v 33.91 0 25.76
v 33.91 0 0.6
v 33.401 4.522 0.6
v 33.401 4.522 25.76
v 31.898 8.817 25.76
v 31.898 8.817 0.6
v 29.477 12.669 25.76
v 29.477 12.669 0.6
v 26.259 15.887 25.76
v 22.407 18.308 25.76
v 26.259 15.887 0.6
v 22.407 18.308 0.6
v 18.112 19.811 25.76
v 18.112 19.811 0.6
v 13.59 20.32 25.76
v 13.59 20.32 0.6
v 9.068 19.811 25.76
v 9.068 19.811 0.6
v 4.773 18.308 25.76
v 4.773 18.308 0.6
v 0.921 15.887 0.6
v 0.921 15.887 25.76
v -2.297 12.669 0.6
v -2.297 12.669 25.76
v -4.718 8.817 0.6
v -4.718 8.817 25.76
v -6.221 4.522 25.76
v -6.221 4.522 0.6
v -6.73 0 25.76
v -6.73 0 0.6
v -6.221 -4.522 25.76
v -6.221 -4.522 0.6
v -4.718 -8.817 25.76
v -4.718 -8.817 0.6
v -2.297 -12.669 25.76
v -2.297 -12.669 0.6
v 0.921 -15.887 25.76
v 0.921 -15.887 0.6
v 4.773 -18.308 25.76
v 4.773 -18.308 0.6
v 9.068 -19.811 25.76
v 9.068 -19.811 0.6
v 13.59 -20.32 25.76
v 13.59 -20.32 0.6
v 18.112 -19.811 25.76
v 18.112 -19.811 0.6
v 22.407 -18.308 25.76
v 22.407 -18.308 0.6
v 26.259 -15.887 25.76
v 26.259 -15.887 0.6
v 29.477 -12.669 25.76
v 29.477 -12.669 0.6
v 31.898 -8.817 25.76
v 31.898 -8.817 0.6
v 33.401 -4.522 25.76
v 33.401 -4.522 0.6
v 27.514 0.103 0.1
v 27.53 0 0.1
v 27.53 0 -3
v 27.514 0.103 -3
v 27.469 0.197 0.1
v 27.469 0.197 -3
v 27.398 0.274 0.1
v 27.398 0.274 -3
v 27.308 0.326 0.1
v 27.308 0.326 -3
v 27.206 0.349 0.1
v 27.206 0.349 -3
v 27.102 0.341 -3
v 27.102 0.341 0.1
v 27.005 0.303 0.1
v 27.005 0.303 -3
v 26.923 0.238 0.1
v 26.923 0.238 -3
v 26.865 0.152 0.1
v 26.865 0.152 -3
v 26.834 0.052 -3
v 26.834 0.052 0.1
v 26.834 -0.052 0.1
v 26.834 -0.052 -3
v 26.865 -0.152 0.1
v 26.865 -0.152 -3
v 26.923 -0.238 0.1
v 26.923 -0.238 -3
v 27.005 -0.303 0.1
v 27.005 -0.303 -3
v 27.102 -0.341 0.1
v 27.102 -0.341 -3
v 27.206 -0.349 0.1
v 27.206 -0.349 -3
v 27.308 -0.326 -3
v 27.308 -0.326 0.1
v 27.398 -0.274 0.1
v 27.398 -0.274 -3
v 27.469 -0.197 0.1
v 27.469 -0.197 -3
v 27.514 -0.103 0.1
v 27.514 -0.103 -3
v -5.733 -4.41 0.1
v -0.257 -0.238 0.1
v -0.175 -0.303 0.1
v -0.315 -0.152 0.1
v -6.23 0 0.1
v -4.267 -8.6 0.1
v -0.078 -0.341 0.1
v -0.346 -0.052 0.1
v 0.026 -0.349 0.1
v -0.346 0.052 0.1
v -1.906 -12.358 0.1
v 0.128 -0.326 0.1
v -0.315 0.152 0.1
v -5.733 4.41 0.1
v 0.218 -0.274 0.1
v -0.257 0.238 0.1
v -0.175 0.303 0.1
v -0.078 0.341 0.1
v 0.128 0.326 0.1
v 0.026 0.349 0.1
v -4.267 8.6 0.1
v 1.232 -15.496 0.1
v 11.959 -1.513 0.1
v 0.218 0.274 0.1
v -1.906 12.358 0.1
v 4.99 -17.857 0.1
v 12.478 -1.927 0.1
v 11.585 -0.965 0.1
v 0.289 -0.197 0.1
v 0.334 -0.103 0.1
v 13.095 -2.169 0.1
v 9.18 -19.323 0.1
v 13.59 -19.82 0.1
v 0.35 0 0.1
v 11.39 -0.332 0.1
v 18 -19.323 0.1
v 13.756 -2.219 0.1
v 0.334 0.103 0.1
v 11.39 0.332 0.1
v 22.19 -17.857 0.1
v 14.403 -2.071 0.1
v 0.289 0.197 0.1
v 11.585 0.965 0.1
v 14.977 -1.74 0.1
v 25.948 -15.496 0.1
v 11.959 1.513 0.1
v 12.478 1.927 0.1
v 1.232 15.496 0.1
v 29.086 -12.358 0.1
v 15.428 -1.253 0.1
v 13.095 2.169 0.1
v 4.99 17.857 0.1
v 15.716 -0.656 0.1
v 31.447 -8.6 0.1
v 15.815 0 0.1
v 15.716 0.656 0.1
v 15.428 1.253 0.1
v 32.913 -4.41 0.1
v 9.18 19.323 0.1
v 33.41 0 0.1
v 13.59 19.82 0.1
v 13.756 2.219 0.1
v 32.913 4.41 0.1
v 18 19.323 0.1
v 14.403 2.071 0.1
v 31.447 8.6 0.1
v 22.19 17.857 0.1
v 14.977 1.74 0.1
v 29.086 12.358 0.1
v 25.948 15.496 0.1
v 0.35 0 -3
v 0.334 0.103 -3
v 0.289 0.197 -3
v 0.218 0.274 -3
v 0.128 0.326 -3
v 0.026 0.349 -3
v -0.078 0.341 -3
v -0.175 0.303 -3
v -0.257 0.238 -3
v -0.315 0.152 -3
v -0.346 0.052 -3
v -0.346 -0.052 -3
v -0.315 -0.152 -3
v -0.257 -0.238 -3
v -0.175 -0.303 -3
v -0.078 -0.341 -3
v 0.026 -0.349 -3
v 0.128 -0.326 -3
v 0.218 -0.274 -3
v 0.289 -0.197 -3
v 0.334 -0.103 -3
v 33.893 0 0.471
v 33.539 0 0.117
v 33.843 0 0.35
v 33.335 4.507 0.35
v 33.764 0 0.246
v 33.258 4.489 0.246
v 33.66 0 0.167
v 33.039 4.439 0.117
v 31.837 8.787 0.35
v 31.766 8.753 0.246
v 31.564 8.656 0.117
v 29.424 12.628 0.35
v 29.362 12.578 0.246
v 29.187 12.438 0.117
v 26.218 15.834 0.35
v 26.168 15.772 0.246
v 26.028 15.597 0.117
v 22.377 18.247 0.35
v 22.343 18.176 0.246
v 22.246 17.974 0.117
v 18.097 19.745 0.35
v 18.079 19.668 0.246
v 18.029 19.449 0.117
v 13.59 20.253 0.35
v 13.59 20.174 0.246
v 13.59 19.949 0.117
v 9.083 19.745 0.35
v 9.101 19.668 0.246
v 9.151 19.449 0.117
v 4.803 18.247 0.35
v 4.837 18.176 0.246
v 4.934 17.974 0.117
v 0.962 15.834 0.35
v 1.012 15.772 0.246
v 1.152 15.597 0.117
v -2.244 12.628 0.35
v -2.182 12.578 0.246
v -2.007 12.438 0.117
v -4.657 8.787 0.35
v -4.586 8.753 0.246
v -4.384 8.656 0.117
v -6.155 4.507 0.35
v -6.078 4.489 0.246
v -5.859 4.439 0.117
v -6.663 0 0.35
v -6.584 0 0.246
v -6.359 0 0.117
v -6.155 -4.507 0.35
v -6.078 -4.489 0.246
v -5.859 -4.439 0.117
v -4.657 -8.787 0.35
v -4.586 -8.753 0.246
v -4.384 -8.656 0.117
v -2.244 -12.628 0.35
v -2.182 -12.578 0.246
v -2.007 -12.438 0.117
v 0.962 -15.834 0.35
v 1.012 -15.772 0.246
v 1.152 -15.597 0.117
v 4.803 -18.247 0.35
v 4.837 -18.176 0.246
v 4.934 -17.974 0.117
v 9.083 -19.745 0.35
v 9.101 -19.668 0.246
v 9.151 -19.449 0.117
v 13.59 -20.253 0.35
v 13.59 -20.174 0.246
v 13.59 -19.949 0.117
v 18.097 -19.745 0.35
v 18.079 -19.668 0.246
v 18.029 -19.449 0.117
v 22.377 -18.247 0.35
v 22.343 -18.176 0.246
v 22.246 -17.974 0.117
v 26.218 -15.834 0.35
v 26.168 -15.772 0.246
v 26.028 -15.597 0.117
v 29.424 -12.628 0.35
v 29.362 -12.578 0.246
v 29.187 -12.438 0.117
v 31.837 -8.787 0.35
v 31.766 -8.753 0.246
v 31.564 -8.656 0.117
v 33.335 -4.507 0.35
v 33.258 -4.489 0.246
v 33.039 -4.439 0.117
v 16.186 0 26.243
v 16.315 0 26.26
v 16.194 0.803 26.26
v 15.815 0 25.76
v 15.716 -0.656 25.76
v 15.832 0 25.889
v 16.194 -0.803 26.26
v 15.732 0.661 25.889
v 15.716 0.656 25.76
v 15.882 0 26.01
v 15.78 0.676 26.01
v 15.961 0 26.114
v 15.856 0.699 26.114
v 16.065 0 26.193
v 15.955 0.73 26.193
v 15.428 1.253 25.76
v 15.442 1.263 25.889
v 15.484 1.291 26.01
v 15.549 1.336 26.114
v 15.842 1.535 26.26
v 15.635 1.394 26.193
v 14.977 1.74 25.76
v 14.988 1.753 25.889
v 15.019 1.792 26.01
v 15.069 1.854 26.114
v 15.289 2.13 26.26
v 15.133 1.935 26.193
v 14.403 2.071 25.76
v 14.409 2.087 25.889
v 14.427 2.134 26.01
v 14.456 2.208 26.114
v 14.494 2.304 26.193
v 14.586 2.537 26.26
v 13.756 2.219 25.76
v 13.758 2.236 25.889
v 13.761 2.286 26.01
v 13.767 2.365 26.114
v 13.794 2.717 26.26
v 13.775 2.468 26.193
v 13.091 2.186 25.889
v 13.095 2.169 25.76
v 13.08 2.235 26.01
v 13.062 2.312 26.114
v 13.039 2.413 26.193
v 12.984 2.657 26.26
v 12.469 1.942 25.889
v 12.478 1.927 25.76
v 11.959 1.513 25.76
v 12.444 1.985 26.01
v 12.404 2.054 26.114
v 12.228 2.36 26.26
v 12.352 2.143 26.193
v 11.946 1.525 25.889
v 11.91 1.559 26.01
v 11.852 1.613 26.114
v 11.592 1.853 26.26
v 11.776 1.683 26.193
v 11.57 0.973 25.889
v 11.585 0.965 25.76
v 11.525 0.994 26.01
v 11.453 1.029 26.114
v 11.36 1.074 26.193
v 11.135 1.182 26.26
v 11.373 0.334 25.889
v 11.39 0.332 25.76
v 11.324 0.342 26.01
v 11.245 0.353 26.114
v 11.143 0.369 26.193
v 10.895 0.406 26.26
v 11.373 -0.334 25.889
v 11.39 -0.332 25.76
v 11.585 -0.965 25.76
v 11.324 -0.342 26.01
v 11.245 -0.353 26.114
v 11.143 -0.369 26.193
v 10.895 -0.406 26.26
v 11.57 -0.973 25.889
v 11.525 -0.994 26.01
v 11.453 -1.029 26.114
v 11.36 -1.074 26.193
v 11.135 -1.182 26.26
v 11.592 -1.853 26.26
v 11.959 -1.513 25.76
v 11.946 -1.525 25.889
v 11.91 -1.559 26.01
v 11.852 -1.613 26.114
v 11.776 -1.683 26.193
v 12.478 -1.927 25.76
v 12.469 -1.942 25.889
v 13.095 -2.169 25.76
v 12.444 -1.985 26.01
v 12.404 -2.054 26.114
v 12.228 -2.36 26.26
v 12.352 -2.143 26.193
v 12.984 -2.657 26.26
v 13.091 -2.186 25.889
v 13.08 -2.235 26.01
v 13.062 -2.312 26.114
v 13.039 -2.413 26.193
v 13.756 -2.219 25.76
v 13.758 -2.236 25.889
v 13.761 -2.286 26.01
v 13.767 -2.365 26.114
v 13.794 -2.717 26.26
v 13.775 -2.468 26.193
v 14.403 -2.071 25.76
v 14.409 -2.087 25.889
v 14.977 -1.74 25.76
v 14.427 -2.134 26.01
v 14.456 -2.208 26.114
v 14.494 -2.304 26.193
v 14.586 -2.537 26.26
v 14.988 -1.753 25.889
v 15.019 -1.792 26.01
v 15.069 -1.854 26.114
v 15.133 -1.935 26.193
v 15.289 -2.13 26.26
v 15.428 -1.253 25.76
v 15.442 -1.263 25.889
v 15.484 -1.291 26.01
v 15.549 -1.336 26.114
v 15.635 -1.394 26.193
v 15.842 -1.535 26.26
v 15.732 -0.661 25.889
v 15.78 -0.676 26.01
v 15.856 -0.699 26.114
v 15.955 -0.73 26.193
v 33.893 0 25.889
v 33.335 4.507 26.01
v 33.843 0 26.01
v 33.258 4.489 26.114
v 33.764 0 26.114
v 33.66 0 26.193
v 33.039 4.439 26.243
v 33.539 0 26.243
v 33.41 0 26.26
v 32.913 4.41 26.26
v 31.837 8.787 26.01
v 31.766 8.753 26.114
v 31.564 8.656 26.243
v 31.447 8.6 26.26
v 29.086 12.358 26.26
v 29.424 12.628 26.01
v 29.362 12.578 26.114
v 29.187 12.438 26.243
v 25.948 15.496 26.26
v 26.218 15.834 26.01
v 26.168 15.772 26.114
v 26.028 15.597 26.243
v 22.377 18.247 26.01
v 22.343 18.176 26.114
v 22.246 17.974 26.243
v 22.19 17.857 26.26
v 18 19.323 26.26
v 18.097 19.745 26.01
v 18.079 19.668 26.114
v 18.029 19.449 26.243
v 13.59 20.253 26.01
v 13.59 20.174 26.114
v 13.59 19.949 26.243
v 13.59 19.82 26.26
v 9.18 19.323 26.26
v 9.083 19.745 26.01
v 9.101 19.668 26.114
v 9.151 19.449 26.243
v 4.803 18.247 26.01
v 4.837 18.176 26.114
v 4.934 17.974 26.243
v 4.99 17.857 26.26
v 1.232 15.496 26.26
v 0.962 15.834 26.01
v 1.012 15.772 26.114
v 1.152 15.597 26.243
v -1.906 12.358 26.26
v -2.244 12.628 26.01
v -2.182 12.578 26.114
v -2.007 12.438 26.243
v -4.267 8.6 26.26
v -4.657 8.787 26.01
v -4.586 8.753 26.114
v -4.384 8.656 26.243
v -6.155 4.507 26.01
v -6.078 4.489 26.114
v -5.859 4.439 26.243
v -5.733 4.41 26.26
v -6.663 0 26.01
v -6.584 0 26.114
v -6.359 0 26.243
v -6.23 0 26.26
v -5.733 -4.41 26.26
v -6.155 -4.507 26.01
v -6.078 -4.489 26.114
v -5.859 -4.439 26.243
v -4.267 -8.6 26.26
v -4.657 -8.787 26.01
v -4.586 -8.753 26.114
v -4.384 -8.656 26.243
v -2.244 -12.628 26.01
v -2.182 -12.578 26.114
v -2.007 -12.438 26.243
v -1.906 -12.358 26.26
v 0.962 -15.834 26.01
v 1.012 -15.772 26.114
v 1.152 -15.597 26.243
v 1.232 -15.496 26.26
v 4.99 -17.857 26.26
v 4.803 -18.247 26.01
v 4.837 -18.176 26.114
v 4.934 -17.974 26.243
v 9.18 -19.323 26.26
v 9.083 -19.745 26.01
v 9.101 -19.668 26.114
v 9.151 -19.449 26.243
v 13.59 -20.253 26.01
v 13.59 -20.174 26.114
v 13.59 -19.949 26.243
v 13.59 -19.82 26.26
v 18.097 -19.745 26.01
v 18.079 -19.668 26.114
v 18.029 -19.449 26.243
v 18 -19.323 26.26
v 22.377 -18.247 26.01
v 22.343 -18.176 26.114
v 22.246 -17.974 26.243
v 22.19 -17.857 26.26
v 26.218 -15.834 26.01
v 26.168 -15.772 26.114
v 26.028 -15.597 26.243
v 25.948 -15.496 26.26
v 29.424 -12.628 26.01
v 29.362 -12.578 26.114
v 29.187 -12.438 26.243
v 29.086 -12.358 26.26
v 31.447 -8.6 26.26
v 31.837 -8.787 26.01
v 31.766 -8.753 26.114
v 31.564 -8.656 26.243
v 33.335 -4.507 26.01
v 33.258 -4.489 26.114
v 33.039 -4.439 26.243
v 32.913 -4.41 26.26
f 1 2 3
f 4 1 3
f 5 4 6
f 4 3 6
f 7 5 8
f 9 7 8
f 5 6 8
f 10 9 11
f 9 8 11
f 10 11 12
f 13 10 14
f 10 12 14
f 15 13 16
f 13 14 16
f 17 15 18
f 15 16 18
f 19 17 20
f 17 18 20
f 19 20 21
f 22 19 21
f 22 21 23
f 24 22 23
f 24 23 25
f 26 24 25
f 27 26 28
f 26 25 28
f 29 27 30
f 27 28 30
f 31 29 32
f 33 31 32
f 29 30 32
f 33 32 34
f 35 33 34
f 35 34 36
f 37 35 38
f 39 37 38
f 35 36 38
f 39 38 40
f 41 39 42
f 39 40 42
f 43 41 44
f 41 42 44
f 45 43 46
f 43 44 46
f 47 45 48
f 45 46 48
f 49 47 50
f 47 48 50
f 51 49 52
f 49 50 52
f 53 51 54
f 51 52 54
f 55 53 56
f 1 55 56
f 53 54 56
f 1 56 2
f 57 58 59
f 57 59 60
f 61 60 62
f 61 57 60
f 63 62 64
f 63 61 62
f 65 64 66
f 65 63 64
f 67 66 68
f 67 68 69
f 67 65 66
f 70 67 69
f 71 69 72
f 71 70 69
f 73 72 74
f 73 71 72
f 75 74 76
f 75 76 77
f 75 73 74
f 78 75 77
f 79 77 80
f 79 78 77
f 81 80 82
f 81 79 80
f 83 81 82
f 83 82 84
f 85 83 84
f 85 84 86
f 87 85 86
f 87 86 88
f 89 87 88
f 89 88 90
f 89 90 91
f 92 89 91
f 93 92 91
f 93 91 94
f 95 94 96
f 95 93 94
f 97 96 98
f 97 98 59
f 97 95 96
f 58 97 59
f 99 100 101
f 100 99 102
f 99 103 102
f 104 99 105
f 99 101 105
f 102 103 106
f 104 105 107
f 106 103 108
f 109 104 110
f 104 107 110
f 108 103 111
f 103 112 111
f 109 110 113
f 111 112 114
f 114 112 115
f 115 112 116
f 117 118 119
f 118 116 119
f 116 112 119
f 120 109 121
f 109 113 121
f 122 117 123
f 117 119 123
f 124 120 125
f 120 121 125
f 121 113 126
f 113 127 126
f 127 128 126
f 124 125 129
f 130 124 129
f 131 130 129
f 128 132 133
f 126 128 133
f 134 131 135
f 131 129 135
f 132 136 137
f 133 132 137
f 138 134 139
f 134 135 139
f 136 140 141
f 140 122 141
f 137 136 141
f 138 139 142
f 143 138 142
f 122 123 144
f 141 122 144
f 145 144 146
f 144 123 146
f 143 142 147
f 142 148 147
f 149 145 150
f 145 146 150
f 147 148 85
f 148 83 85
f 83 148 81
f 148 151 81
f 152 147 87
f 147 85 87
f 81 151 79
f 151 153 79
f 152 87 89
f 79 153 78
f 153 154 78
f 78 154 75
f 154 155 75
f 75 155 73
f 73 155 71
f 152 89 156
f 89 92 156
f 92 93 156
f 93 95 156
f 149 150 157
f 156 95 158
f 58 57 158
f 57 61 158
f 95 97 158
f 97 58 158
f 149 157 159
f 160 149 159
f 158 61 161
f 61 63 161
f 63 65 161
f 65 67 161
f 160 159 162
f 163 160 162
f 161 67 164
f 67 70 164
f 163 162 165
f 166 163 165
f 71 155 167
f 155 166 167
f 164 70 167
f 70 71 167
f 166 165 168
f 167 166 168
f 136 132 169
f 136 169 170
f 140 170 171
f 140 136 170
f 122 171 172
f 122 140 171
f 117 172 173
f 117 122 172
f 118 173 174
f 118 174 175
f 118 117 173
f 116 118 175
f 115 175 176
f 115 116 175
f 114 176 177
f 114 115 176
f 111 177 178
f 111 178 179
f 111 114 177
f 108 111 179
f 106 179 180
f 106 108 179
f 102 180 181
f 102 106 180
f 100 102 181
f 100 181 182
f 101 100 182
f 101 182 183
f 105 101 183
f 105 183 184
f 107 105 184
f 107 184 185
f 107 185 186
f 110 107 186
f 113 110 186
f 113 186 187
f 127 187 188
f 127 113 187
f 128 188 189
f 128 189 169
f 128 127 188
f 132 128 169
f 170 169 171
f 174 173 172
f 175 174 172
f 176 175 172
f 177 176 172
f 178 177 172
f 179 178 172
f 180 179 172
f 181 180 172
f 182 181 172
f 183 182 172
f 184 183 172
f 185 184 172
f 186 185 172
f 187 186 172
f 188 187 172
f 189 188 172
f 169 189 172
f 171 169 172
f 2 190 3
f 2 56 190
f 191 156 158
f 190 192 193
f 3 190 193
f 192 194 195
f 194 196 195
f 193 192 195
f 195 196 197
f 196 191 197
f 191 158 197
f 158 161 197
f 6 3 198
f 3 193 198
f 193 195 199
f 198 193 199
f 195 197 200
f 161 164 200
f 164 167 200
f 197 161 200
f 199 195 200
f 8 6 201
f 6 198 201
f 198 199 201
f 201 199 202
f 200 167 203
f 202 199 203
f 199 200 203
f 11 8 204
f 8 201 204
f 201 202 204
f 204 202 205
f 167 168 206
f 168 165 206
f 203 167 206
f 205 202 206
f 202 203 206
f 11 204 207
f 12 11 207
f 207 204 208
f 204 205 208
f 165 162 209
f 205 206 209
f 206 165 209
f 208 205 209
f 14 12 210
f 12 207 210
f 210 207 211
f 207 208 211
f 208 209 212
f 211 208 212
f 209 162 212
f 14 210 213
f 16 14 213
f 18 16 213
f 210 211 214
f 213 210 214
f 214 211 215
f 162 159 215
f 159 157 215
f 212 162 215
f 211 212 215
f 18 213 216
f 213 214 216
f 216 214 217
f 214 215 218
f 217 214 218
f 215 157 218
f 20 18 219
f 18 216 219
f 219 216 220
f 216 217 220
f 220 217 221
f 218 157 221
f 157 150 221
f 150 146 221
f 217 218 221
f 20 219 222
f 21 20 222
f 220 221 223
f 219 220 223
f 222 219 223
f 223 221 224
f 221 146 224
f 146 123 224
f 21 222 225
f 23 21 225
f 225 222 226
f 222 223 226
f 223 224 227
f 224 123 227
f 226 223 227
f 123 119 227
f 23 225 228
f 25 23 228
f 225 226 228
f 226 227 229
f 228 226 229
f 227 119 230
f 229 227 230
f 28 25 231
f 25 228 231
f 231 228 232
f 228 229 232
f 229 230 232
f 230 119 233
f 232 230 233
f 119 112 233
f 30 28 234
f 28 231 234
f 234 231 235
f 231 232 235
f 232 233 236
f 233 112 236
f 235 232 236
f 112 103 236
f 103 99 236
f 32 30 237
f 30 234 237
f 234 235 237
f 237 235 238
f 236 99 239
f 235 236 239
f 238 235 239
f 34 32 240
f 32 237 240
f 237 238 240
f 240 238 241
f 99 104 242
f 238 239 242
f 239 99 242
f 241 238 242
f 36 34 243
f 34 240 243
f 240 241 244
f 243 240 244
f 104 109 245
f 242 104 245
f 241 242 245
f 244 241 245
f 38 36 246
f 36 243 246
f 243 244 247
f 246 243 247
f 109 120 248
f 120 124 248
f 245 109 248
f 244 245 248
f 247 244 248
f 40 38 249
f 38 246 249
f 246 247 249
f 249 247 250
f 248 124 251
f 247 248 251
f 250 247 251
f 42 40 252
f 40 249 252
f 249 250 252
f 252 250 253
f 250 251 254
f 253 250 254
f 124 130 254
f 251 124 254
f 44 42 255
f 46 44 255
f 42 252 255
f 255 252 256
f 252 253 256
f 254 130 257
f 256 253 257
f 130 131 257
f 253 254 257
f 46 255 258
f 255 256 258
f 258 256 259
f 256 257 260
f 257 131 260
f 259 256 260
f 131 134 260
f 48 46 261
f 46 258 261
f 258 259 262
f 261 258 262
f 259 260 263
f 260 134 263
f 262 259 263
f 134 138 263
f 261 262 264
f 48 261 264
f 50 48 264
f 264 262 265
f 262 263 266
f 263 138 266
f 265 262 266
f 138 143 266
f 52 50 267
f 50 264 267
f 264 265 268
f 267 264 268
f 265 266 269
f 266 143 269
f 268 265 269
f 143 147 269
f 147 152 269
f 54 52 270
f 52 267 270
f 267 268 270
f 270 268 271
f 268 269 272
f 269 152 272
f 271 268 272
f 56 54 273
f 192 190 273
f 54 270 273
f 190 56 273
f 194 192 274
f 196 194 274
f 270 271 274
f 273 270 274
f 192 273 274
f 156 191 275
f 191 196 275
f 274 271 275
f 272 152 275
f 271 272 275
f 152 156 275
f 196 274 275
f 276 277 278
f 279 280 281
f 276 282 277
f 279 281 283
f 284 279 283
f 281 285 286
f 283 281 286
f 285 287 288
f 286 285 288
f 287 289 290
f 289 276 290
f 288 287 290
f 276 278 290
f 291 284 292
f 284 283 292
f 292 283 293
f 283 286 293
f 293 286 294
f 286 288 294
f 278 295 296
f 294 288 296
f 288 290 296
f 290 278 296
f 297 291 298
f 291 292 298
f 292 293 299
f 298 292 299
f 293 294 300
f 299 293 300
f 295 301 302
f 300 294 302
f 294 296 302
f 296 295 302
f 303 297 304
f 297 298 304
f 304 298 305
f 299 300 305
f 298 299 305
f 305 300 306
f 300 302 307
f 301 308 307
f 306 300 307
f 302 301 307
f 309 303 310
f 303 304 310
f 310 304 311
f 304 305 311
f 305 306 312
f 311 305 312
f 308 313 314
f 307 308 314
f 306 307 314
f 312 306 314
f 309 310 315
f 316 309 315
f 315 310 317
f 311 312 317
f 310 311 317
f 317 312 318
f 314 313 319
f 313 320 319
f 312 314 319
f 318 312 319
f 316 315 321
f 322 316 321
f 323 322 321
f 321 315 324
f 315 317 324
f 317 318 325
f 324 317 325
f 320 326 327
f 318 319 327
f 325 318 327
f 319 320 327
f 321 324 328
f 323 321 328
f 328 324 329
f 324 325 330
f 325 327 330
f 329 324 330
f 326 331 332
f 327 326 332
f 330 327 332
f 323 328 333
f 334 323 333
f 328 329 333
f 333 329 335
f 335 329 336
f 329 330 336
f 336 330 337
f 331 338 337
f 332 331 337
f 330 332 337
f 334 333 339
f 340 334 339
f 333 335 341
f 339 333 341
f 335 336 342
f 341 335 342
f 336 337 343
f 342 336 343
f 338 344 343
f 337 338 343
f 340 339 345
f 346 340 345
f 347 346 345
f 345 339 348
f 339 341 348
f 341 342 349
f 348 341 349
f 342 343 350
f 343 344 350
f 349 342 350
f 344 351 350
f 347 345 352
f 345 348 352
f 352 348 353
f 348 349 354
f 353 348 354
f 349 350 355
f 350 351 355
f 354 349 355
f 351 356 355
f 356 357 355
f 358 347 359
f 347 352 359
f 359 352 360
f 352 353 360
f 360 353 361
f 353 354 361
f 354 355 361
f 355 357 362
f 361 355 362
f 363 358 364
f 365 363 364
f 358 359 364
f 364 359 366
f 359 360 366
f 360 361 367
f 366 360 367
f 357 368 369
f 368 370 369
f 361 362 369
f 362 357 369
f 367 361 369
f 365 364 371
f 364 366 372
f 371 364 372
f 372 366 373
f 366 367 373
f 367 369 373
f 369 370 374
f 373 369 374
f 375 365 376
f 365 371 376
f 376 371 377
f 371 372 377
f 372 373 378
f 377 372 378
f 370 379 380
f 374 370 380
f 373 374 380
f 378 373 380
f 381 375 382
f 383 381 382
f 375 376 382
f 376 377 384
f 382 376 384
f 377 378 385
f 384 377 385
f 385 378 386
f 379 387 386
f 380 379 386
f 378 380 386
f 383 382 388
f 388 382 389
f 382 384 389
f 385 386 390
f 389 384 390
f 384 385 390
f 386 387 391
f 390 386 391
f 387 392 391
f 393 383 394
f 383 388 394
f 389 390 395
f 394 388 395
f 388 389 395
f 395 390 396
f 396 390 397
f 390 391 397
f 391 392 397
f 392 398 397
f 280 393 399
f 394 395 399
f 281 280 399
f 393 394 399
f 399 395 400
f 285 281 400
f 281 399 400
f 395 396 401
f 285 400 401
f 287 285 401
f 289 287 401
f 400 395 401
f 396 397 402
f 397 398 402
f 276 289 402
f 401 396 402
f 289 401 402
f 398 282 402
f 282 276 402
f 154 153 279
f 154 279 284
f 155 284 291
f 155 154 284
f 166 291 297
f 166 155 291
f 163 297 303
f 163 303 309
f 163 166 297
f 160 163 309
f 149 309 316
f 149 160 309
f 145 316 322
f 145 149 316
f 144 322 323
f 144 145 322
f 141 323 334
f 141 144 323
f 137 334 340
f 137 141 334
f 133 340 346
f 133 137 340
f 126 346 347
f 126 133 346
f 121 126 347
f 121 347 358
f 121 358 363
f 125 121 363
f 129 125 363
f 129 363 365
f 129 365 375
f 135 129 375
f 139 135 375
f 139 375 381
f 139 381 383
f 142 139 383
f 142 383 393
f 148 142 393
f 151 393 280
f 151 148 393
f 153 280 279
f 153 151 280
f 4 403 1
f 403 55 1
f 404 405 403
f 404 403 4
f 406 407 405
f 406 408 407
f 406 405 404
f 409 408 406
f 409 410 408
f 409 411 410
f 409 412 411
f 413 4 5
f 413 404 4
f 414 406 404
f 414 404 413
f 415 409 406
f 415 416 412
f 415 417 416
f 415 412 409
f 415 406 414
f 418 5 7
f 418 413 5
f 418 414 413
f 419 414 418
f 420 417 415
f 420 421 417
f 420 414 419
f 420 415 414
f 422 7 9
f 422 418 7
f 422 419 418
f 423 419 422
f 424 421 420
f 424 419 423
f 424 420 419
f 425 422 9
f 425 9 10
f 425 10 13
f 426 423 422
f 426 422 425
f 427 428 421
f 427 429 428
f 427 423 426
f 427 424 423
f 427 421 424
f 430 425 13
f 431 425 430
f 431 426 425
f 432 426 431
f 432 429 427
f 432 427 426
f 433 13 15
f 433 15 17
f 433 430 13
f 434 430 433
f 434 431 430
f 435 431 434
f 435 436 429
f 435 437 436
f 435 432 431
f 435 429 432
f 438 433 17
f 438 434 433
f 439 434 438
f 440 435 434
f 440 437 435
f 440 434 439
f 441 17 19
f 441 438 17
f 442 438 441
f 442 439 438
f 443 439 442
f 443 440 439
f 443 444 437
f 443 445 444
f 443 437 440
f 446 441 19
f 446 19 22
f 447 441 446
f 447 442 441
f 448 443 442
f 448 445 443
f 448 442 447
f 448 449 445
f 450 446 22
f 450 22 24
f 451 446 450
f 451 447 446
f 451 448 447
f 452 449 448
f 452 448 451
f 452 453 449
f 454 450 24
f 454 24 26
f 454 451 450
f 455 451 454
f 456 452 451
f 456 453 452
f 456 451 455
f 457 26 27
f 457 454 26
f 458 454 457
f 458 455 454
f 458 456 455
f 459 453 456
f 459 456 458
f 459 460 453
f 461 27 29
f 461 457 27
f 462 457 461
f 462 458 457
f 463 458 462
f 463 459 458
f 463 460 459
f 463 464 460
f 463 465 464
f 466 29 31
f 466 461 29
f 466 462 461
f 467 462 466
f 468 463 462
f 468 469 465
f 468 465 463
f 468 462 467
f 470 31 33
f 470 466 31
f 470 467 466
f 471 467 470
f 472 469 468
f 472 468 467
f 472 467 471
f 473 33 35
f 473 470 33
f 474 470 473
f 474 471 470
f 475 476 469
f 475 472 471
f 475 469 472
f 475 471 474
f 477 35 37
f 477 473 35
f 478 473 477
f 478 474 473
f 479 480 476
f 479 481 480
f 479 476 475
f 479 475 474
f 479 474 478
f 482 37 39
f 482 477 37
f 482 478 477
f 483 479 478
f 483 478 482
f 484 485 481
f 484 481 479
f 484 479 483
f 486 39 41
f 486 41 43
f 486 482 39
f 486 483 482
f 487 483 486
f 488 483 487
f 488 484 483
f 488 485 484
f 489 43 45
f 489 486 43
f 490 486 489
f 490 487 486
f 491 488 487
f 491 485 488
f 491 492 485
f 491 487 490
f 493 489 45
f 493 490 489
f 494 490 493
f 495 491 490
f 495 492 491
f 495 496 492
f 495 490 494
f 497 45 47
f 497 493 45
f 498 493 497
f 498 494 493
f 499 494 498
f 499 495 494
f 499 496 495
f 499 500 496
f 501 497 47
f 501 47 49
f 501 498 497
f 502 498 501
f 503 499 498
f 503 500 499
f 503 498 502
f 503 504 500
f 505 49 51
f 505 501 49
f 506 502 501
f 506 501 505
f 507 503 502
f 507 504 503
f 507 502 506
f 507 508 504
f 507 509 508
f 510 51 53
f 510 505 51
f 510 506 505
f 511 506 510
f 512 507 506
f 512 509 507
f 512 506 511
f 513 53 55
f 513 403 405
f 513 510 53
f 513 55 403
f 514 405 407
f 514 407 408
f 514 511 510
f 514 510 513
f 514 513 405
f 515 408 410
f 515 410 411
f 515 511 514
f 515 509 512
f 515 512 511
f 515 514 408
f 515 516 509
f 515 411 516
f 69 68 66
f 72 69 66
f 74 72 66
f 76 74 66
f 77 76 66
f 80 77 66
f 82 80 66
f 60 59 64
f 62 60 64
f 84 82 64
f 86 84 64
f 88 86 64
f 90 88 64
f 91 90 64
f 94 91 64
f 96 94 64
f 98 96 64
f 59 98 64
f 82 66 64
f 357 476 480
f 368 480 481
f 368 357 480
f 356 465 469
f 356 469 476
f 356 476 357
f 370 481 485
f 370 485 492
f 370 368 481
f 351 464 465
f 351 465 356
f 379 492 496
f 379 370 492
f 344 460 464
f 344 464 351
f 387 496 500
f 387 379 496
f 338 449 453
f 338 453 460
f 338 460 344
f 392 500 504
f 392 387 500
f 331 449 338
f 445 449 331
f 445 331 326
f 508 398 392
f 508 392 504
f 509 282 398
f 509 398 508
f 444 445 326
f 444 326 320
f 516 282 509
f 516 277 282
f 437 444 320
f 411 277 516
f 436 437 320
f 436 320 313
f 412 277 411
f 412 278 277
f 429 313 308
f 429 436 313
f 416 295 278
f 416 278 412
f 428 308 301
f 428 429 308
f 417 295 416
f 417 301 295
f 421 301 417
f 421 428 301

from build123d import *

# Parameters (mm, degrees)
SKETCH_R          = 20.32
SKETCH_R_2        = 2.225
PAD_DEPTH         = 26.16
FILLET_R          = 0.5
SKETCH001_R       = 0.35
PAD001_DEPTH      = 13.08
PAD001_DEPTH_BACK = 3.5


with BuildPart() as fillet_body:
    # Sketch → Pad (new body)
    with BuildSketch(Plane.XY.offset(0.1)):
        with Locations((13.59, 0)):
            Circle(SKETCH_R)
        with Locations((13.59, 0)):
            Circle(SKETCH_R_2, mode=Mode.SUBTRACT)
    extrude(amount=PAD_DEPTH)

    # Fillet
    fillet_edges = [fillet_body.edges().sort_by_distance(p)[0] for p in [
        (11.365, 0, 26.26),
        (-6.73, 0, 26.26),
        (-6.73, 0, 0.1),
    ]]
    fillet(fillet_edges, radius=FILLET_R)


with BuildPart() as pad001_mp_cp:
    # Sketch001 → Pad001 (new body, two sides)
    with BuildSketch(Plane.XY.offset(0.5)) as pad001_sk:
        Circle(SKETCH001_R)
        with Locations((27.18, 0)):
            Circle(SKETCH001_R)
    extrude(amount=PAD001_DEPTH)
    extrude(pad001_sk.sketch, amount=-PAD001_DEPTH_BACK)

    # Pad001_mp_cp: union Fillet body
    add(fillet_body.part)


solid = pad001_mp_cp.part
